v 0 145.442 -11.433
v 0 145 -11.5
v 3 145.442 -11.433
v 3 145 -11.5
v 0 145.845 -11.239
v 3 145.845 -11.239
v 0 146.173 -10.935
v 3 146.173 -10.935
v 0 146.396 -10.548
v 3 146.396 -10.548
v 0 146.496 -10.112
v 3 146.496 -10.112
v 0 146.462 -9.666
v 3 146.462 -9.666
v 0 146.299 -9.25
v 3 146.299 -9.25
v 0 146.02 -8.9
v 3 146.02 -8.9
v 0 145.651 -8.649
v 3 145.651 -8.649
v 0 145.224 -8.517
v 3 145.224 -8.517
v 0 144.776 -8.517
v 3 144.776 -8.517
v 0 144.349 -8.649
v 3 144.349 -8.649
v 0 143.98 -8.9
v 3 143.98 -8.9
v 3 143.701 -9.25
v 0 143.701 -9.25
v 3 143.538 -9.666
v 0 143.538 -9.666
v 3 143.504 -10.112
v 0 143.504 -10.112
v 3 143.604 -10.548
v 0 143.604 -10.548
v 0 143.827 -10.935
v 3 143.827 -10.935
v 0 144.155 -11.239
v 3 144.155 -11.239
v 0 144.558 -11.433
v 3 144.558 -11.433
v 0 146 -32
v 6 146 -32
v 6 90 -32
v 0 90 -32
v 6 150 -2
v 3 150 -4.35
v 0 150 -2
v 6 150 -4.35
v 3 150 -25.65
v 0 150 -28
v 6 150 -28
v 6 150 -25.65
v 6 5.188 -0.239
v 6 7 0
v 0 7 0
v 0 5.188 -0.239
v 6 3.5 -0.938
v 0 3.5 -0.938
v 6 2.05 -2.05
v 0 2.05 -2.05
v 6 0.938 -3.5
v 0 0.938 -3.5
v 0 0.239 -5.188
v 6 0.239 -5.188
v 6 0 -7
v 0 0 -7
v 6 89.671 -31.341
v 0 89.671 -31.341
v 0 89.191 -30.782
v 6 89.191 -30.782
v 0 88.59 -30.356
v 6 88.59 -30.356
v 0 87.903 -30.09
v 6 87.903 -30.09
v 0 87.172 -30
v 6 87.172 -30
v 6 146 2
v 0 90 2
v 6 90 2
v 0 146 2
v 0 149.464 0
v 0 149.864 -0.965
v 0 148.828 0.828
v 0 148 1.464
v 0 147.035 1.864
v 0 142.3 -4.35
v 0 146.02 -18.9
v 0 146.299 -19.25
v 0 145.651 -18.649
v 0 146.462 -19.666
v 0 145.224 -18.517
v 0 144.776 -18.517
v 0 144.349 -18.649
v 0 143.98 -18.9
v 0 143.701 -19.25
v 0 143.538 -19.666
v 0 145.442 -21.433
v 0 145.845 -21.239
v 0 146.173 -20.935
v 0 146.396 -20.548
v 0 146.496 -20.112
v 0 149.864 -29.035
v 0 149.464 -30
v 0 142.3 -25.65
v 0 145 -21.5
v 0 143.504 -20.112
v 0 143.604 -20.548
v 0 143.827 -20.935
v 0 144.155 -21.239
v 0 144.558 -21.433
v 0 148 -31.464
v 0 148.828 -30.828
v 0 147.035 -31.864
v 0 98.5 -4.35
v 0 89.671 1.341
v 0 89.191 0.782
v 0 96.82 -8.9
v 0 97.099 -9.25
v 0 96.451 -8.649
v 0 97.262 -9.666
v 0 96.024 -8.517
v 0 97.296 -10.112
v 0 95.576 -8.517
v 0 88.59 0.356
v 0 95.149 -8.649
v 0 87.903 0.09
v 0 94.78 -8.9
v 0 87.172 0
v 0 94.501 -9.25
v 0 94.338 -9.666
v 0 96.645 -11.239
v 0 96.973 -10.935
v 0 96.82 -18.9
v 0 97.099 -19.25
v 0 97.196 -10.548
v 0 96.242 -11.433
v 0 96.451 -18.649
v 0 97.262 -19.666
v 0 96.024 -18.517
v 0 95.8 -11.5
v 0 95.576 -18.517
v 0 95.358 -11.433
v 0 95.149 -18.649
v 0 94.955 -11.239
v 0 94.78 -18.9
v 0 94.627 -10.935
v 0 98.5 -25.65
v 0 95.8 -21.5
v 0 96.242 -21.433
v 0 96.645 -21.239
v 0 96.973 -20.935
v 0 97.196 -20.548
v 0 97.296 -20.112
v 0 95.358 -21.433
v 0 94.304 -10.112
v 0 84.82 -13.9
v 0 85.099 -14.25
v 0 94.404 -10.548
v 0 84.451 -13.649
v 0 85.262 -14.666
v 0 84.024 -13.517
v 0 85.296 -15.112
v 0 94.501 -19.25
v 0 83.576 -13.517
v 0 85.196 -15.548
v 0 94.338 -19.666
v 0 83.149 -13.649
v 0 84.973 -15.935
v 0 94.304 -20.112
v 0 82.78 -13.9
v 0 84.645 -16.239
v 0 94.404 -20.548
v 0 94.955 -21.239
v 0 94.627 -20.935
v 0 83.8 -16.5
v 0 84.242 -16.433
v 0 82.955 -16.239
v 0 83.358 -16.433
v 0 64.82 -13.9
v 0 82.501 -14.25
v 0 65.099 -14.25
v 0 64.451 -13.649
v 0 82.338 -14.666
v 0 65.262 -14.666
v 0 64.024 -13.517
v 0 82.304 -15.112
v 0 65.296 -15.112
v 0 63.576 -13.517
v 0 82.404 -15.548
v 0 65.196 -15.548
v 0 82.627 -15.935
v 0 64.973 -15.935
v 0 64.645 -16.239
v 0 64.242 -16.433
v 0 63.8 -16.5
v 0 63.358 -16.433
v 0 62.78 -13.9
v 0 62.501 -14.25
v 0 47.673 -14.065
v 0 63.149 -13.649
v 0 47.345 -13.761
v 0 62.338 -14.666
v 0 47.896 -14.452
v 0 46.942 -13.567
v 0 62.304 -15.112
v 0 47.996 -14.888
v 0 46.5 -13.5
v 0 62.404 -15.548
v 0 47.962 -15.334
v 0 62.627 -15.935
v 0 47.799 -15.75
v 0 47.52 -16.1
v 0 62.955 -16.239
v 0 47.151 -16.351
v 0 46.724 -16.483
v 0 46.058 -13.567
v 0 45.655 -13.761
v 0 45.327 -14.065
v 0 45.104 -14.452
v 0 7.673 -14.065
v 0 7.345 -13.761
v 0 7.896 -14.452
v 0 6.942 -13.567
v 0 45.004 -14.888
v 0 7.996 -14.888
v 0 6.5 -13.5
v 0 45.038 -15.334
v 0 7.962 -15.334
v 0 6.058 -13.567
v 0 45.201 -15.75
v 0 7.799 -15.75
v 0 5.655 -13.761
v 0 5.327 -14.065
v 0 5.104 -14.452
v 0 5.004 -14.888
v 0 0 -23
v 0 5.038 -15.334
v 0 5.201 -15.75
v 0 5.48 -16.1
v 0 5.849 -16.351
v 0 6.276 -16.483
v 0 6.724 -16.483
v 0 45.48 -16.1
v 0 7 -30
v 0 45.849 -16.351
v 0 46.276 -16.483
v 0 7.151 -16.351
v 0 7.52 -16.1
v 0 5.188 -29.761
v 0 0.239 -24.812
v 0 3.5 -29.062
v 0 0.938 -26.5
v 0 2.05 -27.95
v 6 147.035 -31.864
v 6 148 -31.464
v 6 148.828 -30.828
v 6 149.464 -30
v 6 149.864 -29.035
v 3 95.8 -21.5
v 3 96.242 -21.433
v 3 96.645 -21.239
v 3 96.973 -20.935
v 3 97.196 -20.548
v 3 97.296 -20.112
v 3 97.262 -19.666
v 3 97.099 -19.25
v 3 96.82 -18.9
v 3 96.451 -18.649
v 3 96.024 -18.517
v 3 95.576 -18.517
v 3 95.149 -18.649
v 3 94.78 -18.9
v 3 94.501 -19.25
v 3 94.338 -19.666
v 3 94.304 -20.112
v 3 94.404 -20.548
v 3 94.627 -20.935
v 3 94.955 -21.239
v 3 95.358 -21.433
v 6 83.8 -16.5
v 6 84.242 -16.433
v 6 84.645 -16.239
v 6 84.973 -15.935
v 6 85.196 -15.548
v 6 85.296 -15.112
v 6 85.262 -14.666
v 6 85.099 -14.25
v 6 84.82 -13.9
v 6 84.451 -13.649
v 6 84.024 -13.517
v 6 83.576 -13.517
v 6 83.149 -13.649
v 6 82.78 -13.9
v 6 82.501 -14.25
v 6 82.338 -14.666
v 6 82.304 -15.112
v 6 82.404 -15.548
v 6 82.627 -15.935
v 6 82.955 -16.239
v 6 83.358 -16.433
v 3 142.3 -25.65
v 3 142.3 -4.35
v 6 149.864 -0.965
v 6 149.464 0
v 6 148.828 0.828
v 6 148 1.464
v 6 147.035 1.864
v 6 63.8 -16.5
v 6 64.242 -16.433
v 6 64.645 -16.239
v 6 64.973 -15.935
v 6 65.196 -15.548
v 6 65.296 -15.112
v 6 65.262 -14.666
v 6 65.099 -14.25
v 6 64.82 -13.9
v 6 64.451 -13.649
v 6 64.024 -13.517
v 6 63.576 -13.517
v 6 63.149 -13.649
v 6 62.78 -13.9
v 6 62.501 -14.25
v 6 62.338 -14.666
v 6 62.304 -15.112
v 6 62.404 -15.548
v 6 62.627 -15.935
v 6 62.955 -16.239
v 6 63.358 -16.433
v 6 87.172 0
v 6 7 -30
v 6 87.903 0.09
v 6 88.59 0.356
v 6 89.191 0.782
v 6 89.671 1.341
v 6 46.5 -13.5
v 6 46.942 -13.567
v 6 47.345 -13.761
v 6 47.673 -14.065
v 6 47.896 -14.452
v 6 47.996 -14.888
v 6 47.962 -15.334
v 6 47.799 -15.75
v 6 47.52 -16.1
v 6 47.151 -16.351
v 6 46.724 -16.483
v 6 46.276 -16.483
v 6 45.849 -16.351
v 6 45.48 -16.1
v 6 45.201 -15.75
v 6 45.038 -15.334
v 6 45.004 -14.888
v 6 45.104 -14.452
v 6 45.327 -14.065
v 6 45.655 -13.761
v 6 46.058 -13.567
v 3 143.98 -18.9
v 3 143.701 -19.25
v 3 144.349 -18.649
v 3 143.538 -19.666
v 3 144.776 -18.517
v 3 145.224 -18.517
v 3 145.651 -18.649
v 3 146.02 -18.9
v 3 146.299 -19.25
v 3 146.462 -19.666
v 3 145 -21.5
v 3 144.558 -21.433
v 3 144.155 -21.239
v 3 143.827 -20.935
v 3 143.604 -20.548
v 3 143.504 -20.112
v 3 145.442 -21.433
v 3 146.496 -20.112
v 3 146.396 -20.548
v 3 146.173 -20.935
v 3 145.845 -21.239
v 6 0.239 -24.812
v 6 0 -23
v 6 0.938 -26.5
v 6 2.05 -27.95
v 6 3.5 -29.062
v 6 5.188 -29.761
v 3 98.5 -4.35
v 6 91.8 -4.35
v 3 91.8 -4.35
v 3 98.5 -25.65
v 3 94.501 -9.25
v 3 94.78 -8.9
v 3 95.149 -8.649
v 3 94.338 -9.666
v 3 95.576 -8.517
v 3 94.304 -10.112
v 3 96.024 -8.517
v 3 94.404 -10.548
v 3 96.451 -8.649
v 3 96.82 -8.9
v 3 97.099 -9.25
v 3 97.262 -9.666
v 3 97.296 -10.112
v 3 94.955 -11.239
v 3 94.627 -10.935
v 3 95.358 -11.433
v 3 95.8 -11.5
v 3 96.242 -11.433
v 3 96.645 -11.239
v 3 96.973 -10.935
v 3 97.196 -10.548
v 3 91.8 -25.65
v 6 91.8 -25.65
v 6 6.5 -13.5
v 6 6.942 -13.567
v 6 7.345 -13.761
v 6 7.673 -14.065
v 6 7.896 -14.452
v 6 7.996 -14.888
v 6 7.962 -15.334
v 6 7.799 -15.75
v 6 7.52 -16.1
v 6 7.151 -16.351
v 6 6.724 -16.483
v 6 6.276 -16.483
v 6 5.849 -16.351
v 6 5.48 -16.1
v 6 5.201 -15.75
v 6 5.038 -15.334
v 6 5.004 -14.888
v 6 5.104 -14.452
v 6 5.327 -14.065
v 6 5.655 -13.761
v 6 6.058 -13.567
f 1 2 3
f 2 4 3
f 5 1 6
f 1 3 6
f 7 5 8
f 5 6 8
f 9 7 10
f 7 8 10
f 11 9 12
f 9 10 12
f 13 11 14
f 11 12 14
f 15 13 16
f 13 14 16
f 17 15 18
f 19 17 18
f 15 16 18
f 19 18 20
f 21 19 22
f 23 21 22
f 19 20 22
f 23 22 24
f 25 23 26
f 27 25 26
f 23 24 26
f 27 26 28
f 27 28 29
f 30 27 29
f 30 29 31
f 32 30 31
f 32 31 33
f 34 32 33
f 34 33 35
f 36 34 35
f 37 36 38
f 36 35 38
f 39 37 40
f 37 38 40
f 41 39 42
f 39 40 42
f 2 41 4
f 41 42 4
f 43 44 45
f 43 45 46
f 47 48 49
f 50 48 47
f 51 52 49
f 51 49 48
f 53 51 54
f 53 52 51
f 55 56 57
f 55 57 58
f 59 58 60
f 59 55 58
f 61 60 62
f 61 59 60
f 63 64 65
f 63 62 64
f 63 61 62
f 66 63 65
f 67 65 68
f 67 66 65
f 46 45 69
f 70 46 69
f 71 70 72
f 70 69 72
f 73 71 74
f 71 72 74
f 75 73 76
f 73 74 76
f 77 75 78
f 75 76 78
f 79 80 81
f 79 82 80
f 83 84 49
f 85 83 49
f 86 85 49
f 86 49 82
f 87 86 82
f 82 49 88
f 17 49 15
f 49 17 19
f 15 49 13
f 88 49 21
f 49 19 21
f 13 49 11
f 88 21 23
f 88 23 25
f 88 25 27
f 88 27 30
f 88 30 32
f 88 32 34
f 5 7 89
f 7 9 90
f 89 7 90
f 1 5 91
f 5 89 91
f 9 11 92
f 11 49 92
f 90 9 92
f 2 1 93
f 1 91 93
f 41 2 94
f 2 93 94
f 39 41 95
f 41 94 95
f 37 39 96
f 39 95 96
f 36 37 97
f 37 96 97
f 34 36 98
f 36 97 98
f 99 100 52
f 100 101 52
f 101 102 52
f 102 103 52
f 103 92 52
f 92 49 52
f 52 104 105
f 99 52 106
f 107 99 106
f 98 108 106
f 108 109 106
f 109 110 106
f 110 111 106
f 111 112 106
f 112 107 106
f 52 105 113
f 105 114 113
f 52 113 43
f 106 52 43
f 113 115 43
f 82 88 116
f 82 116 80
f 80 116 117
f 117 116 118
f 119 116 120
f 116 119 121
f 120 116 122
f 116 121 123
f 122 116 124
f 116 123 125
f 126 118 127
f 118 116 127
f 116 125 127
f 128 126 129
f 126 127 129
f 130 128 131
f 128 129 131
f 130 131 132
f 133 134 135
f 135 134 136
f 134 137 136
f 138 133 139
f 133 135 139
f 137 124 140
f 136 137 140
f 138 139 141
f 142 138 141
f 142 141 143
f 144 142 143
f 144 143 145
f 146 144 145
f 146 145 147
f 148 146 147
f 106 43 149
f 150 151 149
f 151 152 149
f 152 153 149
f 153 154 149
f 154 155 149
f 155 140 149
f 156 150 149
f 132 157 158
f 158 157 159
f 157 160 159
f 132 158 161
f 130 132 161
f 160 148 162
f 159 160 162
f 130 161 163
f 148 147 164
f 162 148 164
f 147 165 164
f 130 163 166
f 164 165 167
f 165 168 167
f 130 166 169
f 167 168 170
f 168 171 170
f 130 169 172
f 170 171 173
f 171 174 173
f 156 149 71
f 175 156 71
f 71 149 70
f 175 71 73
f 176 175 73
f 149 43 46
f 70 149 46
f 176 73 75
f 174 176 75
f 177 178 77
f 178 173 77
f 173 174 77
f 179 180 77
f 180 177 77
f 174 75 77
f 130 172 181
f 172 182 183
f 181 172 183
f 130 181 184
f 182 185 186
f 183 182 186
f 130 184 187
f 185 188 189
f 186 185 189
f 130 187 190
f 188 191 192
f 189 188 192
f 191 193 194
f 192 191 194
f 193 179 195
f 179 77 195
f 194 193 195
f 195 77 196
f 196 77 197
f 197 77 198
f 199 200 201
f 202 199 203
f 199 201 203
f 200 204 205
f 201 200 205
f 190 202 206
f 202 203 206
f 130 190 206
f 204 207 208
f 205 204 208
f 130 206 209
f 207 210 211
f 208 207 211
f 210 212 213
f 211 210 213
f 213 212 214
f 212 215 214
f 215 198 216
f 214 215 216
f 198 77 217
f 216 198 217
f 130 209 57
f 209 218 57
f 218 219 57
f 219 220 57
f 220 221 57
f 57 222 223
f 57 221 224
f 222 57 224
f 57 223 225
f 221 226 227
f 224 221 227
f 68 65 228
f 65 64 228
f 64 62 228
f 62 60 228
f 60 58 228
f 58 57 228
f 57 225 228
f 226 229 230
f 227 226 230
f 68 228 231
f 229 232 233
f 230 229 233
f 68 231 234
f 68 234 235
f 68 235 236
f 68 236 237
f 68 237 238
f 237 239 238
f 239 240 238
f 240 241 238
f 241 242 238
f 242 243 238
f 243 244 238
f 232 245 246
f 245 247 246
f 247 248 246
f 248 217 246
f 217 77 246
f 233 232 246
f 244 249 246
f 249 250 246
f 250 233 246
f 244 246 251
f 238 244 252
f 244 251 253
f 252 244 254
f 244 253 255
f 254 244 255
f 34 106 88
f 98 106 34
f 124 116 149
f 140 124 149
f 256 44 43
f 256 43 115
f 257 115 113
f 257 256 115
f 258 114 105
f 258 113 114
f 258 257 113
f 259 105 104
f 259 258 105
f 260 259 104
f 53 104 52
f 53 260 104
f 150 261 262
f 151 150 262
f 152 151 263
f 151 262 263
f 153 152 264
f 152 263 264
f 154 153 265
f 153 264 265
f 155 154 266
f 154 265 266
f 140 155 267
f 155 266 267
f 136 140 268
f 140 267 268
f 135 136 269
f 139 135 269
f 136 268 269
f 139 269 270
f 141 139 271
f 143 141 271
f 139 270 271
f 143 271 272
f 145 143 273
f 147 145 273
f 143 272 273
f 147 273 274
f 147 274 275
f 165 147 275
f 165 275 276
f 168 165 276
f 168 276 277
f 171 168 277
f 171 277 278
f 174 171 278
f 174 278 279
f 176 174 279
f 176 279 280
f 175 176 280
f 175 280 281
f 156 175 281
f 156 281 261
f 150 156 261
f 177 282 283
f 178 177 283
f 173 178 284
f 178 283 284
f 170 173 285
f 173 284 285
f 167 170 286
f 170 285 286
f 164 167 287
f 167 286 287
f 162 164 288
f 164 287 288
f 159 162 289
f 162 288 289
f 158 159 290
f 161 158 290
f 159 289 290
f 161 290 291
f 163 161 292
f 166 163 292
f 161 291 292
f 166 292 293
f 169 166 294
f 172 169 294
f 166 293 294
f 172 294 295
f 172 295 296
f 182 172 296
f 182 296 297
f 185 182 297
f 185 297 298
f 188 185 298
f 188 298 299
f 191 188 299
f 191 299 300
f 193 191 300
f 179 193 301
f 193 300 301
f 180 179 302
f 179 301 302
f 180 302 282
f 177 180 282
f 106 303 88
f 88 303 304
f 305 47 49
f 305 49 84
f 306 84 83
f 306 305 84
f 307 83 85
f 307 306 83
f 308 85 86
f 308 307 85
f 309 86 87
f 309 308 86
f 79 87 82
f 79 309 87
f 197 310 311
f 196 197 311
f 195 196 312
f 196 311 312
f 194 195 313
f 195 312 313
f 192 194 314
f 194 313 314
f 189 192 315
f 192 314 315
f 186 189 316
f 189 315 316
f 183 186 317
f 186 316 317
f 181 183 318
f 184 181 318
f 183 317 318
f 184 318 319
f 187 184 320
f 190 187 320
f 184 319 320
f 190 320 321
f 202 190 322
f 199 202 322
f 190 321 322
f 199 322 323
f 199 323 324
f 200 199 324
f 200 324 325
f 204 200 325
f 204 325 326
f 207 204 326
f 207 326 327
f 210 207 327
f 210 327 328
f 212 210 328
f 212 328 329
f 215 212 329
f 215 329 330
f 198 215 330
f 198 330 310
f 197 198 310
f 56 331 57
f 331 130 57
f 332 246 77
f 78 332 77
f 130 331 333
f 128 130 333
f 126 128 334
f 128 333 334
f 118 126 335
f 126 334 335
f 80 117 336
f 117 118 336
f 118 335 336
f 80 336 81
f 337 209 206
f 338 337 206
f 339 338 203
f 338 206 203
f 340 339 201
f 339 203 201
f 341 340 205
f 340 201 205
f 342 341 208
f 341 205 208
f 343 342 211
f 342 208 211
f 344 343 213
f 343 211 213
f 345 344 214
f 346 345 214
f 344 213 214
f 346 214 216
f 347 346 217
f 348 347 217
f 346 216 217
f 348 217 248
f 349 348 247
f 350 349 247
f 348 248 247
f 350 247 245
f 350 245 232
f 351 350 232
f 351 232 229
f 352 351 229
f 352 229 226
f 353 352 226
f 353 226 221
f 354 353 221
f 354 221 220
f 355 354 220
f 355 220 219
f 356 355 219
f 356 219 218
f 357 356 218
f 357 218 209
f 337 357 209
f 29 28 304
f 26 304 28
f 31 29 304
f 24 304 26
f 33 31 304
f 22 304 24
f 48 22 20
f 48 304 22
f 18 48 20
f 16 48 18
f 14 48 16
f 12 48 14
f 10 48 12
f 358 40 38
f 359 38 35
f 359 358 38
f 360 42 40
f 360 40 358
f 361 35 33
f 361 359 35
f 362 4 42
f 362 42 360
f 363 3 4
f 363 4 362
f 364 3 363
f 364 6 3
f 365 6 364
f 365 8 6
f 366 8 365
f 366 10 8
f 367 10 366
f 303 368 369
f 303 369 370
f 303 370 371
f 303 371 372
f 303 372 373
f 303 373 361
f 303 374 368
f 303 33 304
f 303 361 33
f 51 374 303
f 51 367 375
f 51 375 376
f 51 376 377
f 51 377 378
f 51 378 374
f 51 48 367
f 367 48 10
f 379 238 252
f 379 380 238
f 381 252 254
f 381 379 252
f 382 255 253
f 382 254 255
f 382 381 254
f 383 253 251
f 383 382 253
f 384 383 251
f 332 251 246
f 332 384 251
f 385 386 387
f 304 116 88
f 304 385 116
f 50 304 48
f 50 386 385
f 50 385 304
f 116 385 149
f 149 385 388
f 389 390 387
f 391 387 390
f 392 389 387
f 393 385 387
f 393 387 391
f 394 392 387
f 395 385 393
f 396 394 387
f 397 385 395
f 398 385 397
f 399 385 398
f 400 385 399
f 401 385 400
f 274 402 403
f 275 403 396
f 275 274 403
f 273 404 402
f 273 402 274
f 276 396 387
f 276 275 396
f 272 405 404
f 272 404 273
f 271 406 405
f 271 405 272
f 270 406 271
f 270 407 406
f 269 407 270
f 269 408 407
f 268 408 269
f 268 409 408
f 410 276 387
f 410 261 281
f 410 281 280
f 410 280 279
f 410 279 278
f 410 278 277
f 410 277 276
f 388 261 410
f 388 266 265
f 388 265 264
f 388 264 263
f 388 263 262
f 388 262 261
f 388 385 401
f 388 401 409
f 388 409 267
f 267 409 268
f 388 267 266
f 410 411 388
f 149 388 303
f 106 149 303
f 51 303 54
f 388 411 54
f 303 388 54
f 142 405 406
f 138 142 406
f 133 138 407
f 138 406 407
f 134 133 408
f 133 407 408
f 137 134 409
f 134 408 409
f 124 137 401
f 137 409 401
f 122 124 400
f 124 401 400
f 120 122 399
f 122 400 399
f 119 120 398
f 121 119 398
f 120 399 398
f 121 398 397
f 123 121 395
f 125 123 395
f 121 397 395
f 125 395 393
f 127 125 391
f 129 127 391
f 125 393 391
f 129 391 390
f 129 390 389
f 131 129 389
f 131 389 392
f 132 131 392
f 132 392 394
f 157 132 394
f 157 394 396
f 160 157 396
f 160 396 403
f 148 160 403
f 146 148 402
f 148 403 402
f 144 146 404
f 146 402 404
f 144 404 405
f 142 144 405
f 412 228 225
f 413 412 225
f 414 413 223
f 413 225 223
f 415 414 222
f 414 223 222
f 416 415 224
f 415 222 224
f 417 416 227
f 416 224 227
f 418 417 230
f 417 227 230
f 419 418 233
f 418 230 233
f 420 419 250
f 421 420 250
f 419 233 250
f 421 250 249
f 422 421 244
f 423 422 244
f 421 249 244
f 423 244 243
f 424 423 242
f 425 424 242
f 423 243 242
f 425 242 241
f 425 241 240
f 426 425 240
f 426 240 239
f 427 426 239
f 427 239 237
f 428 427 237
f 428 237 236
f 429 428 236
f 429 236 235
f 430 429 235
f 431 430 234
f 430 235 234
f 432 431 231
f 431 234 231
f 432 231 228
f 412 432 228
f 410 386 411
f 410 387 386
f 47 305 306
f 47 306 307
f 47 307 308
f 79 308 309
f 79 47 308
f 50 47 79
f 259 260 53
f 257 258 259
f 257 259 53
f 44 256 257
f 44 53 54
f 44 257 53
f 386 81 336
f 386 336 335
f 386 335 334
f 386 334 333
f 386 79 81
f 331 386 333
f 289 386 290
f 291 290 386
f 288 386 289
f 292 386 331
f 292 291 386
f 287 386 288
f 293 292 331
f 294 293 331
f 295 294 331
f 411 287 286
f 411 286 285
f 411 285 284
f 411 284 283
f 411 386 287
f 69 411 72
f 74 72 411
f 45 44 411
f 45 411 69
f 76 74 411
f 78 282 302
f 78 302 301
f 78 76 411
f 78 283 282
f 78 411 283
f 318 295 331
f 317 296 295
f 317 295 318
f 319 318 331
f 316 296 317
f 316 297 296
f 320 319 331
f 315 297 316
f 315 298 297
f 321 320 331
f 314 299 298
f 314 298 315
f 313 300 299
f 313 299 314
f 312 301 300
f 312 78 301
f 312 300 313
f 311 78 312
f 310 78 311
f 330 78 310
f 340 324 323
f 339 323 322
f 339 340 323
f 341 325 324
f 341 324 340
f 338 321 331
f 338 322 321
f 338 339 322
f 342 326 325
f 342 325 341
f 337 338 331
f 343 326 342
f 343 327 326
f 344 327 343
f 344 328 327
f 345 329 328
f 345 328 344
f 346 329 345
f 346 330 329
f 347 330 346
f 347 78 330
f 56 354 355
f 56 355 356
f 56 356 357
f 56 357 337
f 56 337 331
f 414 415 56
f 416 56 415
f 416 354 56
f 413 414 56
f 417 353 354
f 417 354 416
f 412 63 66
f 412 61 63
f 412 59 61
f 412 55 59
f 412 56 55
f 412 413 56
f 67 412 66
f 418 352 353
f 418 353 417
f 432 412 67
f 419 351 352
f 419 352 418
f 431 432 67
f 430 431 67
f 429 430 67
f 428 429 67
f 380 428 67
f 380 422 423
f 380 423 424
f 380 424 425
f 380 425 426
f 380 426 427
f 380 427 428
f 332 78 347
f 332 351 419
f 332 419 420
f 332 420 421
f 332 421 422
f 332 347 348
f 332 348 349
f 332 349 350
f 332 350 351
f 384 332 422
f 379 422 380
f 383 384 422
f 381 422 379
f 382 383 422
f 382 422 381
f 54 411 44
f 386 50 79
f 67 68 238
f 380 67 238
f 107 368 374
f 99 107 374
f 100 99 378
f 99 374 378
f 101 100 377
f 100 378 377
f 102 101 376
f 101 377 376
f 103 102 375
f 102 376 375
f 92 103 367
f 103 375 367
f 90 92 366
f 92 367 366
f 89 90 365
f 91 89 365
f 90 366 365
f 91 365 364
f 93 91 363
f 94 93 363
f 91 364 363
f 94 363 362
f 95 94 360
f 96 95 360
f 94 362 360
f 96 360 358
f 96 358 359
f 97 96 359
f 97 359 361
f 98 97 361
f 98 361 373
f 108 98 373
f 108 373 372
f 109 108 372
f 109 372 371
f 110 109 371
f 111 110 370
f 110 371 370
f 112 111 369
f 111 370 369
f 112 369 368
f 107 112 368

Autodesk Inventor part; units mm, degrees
ref_plane "YZ Plane" through (0, 0, 0) normal (1, 0, 0) x (0, 1, 0)
ref_plane "XZ Plane" through (0, 0, 0) normal (0, 1, 0) x (-1, 0, 0)
ref_plane "XY Plane" through (0, 0, 0) normal (0, 0, 1) x (1, 0, 0)
sketch "Sketch1" plane through (0, 0, 0) normal (1, 0, 0) x (0, 1, 0)
  line L0 (0, 0) -> (0, -30)
  line L1 (0, -30) -> (150, -30)
  line L2 (150, -30) -> (150, 0)
  line L3 (150, 0) -> (0, 0)
  dimension "d0" = 30
  dimension "d1" = 150
extrude "Extrusion1" add sketch "Sketch1" along normal blind 3
sketch "Sketch2" plane through (3, 0, 0) normal (1, 0, 0) x (0, 0, -1)
  line L0 (30, 0) -> (30, 150) projected
  line L1 (30, 150) -> (0, 150) projected
  line L2 (0, 150) -> (0, 0) projected
  line L3 (0, 0) -> (30, 0) projected
  line L4 (30, 150) -> (0, 150) projected
  line L5 (0, 150) -> (0, 145)
  line L6 (0, 150) -> (0, 0) projected
  line L7 (0, 145) -> (30, 145)
  line L8 (30, 0) -> (30, 150) projected
  line L9 (0, 145) -> (15, 145)
  line L10 (15, 145) -> (20, 145)
  line L11 (15, 145) -> (10, 145)
  circle A0 centre (10, 145) radius 1.5
  circle A1 centre (20, 145) radius 1.5
  circle A2 centre (20, 95.8) radius 1.5
  circle A3 centre (10, 95.8) radius 1.5
  line L12 (20, 95.8) -> (20, 97.3)
  line L13 (20, 143.5) -> (20, 145)
  line L14 (10, 95.8) -> (11.5, 95.8)
  line L15 (18.5, 95.8) -> (20, 95.8)
  line L16 (10, 145) -> (10, 143.5)
  line L17 (10, 97.3) -> (10, 95.8)
  line L18 (15, 145) -> (15, 120.4)
  line L19 (15, 120.4) -> (15, 140.9)
  line L20 (15, 140.9) -> (25.15, 140.9)
  line L21 (25.15, 140.9) -> (25.15, 99.9)
  line L22 (25.15, 99.9) -> (4.85, 99.9)
  line L23 (4.85, 99.9) -> (4.85, 140.9)
  line L24 (4.85, 140.9) -> (15, 140.9)
  dimension "d8" = 3
  dimension "d9" = 3
  dimension "d4" = 5
  dimension "d5" = 15
  dimension "d6" = 5
  dimension "d7" = 5
  dimension "d10" = 49.2
  dimension "d11" = 3
  dimension "d12" = 3
  dimension "d15" = 24.6
  dimension "d16" = 20.5
  dimension "d17" = 10.15
  dimension "d18" = 41
  dimension "d19" = 20.3
extrude "Extrusion2" cut sketch "Sketch2" against normal through all contours A1 L13 L7 | L7 A1 | L13 A1 L7 | A0 L7 | L7 L16 A0 | L7 A0 L16 | A2 L15 L12 | L12 L15 A2 | L14 L17 A3 | A3 L17 L14 | L20 L21 L22 L23 L24
sketch "Sketch3" plane through (3, 0, 0) normal (1, 0, 0) x (0, 0, -1)
  circle A0 centre (20, 145) radius 1.5 projected
  circle A1 centre (10, 95.8) radius 1.5 projected
  circle A2 centre (10, 145) radius 1.5 projected
  circle A3 centre (20, 95.8) radius 1.5 projected
  line L0 (25.15, 140.9) -> (25.15, 99.9) projected
  line L1 (25.15, 99.9) -> (4.85, 99.9) projected
  line L2 (4.85, 99.9) -> (4.85, 140.9) projected
  line L3 (4.85, 140.9) -> (25.15, 140.9) projected
  line L4 (30, 0) -> (30, 150) projected
  line L5 (30, 150) -> (0, 150) projected
  line L6 (0, 150) -> (0, 0) projected
  line L7 (0, 0) -> (30, 0) projected
  line L8 (20, 95.8) -> (15, 95.8)
  line L9 (15, 95.8) -> (15, 85.8)
  circle A4 centre (15, 85.8) radius 1.5
  line L10 (15, 85.8) -> (15, 65.8)
  circle A5 centre (15, 65.8) radius 1.5
  line L11 (20, 95.8) -> (20, 91.8)
  line L12 (20, 91.8) -> (25.15, 91.8)
  line L13 (25.15, 91.8) -> (25.15, 99.9)
  line L14 (20, 91.8) -> (4.85, 91.8)
  line L15 (25.15, 99.9) -> (4.85, 99.9) projected
  line L16 (4.85, 91.8) -> (4.85, 99.9)
  line L17 (25.15, 99.9) -> (25.15, 150)
  line L18 (30, 150) -> (0, 150) projected
  line L19 (4.85, 99.9) -> (4.85, 150)
  dimension "d22" = 5
  dimension "d23" = 10
  dimension "d24" = 3
  dimension "d34" = 20
  dimension "d35" = 3
  dimension "d41" = 4
extrude "Extrusion7" add sketch "Sketch3" along normal blind 3 contours L12 L13 L0 L17 L5 L4 L7 L6 L19 L2 L16 L14 | A4 L10 L9 | L9 L10 A4 | A5
sketch "Sketch5" plane through (0, 0, 0) normal (-1, 0, 0) x (0, 0, 1)
  circle A0 centre (-20, 145) radius 1.5 projected
  circle A1 centre (-10, 95.8) radius 1.5 projected
  circle A2 centre (-10, 145) radius 1.5 projected
  circle A3 centre (-20, 95.8) radius 1.5 projected
  line L0 (-25.15, 99.9) -> (-25.15, 140.9) projected
  line L1 (-25.15, 140.9) -> (-4.85, 140.9) projected
  line L2 (-4.85, 140.9) -> (-4.85, 99.9) projected
  line L3 (-4.85, 99.9) -> (-25.15, 99.9) projected
  line L4 (-30, 0) -> (-30, 150) projected
  line L5 (0, 0) -> (-30, 0) projected
  line L6 (0, 150) -> (0, 0) projected
  line L7 (-30, 150) -> (0, 150) projected
  line L8 (0, 146) -> (0, 0) projected
  line L9 (0, 0) -> (-15, 0)
  line L10 (0, 0) -> (-30, 0) projected
  line L11 (-15, 0) -> (-15, 6.5)
  circle A4 centre (-15, 6.5) radius 1.5
  line L12 (-15, 6.5) -> (-15, 46.5)
  circle A5 centre (-15, 46.5) radius 1.5
  dimension "d45" = 15
  dimension "d46" = 6.5
  dimension "d47" = 3
  dimension "d48" = 40
  dimension "d49" = 3
extrude "Extrusion8" cut sketch "Sketch5" against normal blind 10 contours A4 L12 L11 | L11 L12 A4 | A5
sketch "Sketch6" plane through (6, 0, 0) normal (1, 0, 0) x (0, 0, -1)
  circle A0 centre (15, 6.5) radius 1.5 projected
  circle A1 centre (15, 46.5) radius 1.5 projected
  line L0 (30, 150) -> (25.15, 150) projected
  line L1 (25.15, 150) -> (25.15, 91.8) projected
  line L2 (25.15, 91.8) -> (4.85, 91.8) projected
  line L3 (4.85, 91.8) -> (4.85, 150) projected
  line L4 (4.85, 150) -> (0, 150) projected
  line L5 (0, 150) -> (0, 0) projected
  line L6 (0, 0) -> (30, 0) projected
  line L7 (30, 0) -> (30, 150) projected
  line L8 (25.15, 91.8) -> (25.15, 99.9) projected
  line L9 (25.15, 99.9) -> (4.85, 99.9) projected
  line L10 (4.85, 99.9) -> (4.85, 91.8) projected
  line L11 (4.85, 91.8) -> (25.15, 91.8) projected
  circle A2 centre (10, 95.8) radius 1.5 projected
  circle A3 centre (20, 95.8) radius 1.5 projected
  circle A4 centre (20, 95.8) radius 1.5 projected
  line L12 (20, 95.8) -> (15, 95.8)
  line L13 (15, 95.8) -> (15, 91.8)
  line L14 (25.15, 91.8) -> (4.85, 91.8) projected
  line L15 (15, 91.8) -> (15, 88.8)
  line L16 (15, 88.8) -> (15, 83.8)
  line L17 (15, 83.8) -> (15, 63.8)
  circle A5 centre (15, 63.8) radius 1.5
  circle A6 centre (15, 83.8) radius 1.5
  dimension "d52" = 5
  dimension "d53" = 3
  dimension "d54" = 5
  dimension "d55" = 20
  dimension "d56" = 3
  dimension "d57" = 3
extrude "Extrusion9" cut sketch "Sketch6" against normal blind 10 contours A6 L17 L16 | L16 L17 A6 | A5
sketch "Sketch8" plane through (6, 0, 0) normal (1, 0, 0) x (0, 0, -1)
  circle A0 centre (15, 63.8) radius 1.5 projected
  circle A1 centre (15, 83.8) radius 1.5 projected
  circle A2 centre (15, 6.5) radius 1.5 projected
  circle A3 centre (15, 46.5) radius 1.5 projected
  line L0 (30, 150) -> (25.15, 150) projected
  line L1 (25.15, 150) -> (25.15, 91.8) projected
  line L2 (25.15, 91.8) -> (4.85, 91.8) projected
  line L3 (4.85, 91.8) -> (4.85, 150) projected
  line L4 (4.85, 150) -> (0, 150) projected
  line L5 (0, 150) -> (0, 0) projected
  line L6 (0, 0) -> (30, 0) projected
  line L7 (30, 0) -> (30, 150) projected
  line L8 (4.85, 91.8) -> (25.15, 91.8) projected
  line L9 (25.15, 91.8) -> (25.65, 91.8)
  line L10 (25.65, 91.8) -> (25.65, 150)
  line L11 (26, 150) -> (4, 150) projected
  line L12 (4.85, 91.8) -> (4.35, 91.8)
  line L13 (4.35, 91.8) -> (4.35, 150)
  line L14 (4.85, 150) -> (4, 150) projected
  dimension "d60" = 0.5
  dimension "d61" = 0.5
extrude "Extrusion10" cut sketch "Sketch8" against normal blind 3 contours L10 L9 L1 L0 | L3 L12 L13 L4
sketch "Sketch9" plane through (3, 0, 0) normal (1, 0, 0) x (0, 0, -1)
  line L0 (4.35, 91.8) -> (25.65, 91.8) projected
  line L1 (25.65, 150) -> (25.65, 91.8) projected
  line L2 (25.65, 150) -> (4.35, 150) projected
  line L3 (4.35, 91.8) -> (4.35, 150) projected
  circle A0 centre (20, 145) radius 1.5 projected
  circle A1 centre (10, 145) radius 1.5 projected
  line L4 (4.85, 140.9) -> (4.85, 99.9) projected
  line L5 (4.85, 140.9) -> (25.15, 140.9) projected
  line L6 (25.15, 99.9) -> (25.15, 140.9) projected
  line L7 (25.15, 99.9) -> (4.85, 99.9) projected
  circle A2 centre (10, 95.8) radius 1.5 projected
  circle A3 centre (20, 95.8) radius 1.5 projected
  circle A4 centre (15, 46.5) radius 1.5 projected
  circle A5 centre (15, 6.5) radius 1.5 projected
  circle A6 centre (15, 83.8) radius 1.5 projected
  circle A7 centre (15, 63.8) radius 1.5 projected
  line L8 (25.65, 91.8) -> (4.35, 91.8) projected
  line L9 (4.35, 91.8) -> (4.35, 150) projected
  line L10 (4.35, 150) -> (0, 150) projected
  line L11 (0, 150) -> (0, 0) projected
  line L12 (0, 0) -> (30, 0) projected
  line L13 (30, 0) -> (30, 150) projected
  line L14 (30, 150) -> (25.65, 150) projected
  line L15 (25.65, 150) -> (25.65, 91.8) projected
  line L16 (4.85, 140.9) -> (25.15, 140.9) projected
  line L17 (4.85, 140.9) -> (4.35, 140.9)
  line L18 (25.15, 99.9) -> (25.15, 140.9) projected
  line L19 (25.15, 140.9) -> (25.65, 140.9)
  line L20 (25.65, 150) -> (25.65, 91.8) projected
  line L21 (25.15, 99.9) -> (4.85, 99.9) projected
  line L22 (25.15, 99.9) -> (25.65, 99.9)
  line L23 (4.85, 99.9) -> (4.35, 99.9)
extrude "Extrusion11" cut sketch "Sketch9" against normal blind 3 contours L3 L17 L4 L23 | L22 L6 L19 L1
sketch "Sketch10" plane through (3, 0, 0) normal (1, 0, 0) x (0, 0, -1)
  line L0 (4.35, 140.9) -> (25.65, 140.9) projected
  line L1 (25.65, 150) -> (25.65, 140.9) projected
  line L2 (25.65, 150) -> (4.35, 150) projected
  line L3 (4.35, 140.9) -> (4.35, 150) projected
  circle A0 centre (10, 145) radius 1.5 projected
  circle A1 centre (20, 145) radius 1.5 projected
  line L4 (25.65, 99.9) -> (4.35, 99.9) projected
  line L5 (4.35, 91.8) -> (4.35, 99.9) projected
  line L6 (4.35, 91.8) -> (25.65, 91.8) projected
  line L7 (25.65, 99.9) -> (25.65, 91.8) projected
  circle A2 centre (10, 95.8) radius 1.5 projected
  circle A3 centre (20, 95.8) radius 1.5 projected
  line L8 (4.35, 140.9) -> (4.35, 141.9)
  line L9 (4.35, 91.8) -> (4.35, 150) projected
  line L10 (25.65, 150) -> (25.65, 91.8) projected
  line L11 (25.65, 140.9) -> (25.65, 141.9)
  line L12 (4.35, 99.9) -> (4.35, 99.4)
  line L13 (4.35, 99.4) -> (25.65, 99.4)
  line L14 (25.65, 99.9) -> (25.65, 99.4)
  line L15 (4.35, 140.9) -> (4.35, 141.4)
  line L16 (4.35, 141.4) -> (25.65, 141.4)
  line L17 (25.65, 141.4) -> (25.65, 140.9)
  point P0 (0, 0)
  dimension "d67" = 0.5
  dimension "d68" = 0.5
extrude "Extrusion12" cut sketch "Sketch10" against normal blind 3 contours L3 L16 L1 L0 | L4 L7 L13 L5
sketch "Sketch11" plane through (3, 0, 0) normal (1, 0, 0) x (0, 0, -1)
  circle A0 centre (20, 145) radius 1.5 projected
  circle A1 centre (10, 145) radius 1.5 projected
  line L0 (4.35, 141.4) -> (25.65, 141.4) projected
  line L1 (25.65, 150) -> (25.65, 141.4) projected
  line L2 (25.65, 150) -> (4.35, 150) projected
  line L3 (4.35, 141.4) -> (4.35, 150) projected
  line L4 (25.65, 99.4) -> (4.35, 99.4) projected
  line L5 (4.35, 91.8) -> (4.35, 99.4) projected
  line L6 (4.35, 91.8) -> (25.65, 91.8) projected
  line L7 (25.65, 99.4) -> (25.65, 91.8) projected
  circle A2 centre (10, 95.8) radius 1.5 projected
  circle A3 centre (20, 95.8) radius 1.5 projected
  circle A4 centre (10, 95.8) radius 1.5 projected
  line L8 (10, 97.3) -> (10, 98.5)
  line L9 (10, 98.5) -> (25.65, 98.5)
  line L10 (25.65, 150) -> (25.65, 91.8) projected
  line L11 (10, 98.5) -> (4.35, 98.5)
  line L12 (4.35, 91.8) -> (4.35, 150) projected
  circle A5 centre (10, 145) radius 1.5 projected
  line L13 (10, 143.5) -> (10, 142.3)
  line L14 (10, 142.3) -> (25.65, 142.3)
  line L15 (10, 142.3) -> (4.35, 142.3)
  point P0 (0, 0)
  point P1 (4.35, 142.3)
  point P2 (4.35, 98.5)
  dimension "d71" = 1.2
  dimension "d72" = 1.2
extrude "Extrusion13" cut sketch "Sketch11" against normal blind 3 contours L3 L15 L14 L1 L0 | L4 L7 L9 L11 L5
sketch "Sketch12" plane through (0, 0, -30) normal (0, 0, -1) x (-1, 0, 0)
  line L0 (0, 0) -> (0, 150) projected
  line L1 (0, 150) -> (-6, 150) projected
  line L2 (-6, 0) -> (-6, 150) projected
  line L3 (0, 0) -> (-6, 0) projected
  line L4 (-6, 150) -> (-6, 90)
  line L5 (-6, 0) -> (-6, 150) projected
  line L6 (-6, 90) -> (0, 90)
  line L7 (0, 0) -> (0, 150) projected
  dimension "d75" = 60
extrude "Extrusion14" add sketch "Sketch12" along normal blind 2 contours L6 L2 L1 L0
sketch "Sketch13" plane through (0, 0, 0) normal (0, 0, 1) x (1, 0, 0)
  line L0 (0, 150) -> (0, 0) projected
  line L1 (0, 0) -> (6, 0) projected
  line L2 (6, 150) -> (6, 0) projected
  line L3 (0, 150) -> (6, 150) projected
  line L4 (6, 150) -> (6, 90) projected
  line L5 (6, 150) -> (6, 90)
  line L6 (6, 90) -> (0, 90)
  dimension "d78" = 60
extrude "Extrusion15" add sketch "Sketch13" along normal blind 2 contours L3 L2 L6 L0
fillet "Fillet3" radius 4 2 edges at (3, 150, 2) (3, 150, -32)
fillet "Fillet4" radius 3 2 edges at (3, 90, 0) (3, 90, -30)
fillet "Fillet5" radius 7 2 edges at (3, 0, -30) (3, 0, 0)
properties part number "antebrazo_1"
